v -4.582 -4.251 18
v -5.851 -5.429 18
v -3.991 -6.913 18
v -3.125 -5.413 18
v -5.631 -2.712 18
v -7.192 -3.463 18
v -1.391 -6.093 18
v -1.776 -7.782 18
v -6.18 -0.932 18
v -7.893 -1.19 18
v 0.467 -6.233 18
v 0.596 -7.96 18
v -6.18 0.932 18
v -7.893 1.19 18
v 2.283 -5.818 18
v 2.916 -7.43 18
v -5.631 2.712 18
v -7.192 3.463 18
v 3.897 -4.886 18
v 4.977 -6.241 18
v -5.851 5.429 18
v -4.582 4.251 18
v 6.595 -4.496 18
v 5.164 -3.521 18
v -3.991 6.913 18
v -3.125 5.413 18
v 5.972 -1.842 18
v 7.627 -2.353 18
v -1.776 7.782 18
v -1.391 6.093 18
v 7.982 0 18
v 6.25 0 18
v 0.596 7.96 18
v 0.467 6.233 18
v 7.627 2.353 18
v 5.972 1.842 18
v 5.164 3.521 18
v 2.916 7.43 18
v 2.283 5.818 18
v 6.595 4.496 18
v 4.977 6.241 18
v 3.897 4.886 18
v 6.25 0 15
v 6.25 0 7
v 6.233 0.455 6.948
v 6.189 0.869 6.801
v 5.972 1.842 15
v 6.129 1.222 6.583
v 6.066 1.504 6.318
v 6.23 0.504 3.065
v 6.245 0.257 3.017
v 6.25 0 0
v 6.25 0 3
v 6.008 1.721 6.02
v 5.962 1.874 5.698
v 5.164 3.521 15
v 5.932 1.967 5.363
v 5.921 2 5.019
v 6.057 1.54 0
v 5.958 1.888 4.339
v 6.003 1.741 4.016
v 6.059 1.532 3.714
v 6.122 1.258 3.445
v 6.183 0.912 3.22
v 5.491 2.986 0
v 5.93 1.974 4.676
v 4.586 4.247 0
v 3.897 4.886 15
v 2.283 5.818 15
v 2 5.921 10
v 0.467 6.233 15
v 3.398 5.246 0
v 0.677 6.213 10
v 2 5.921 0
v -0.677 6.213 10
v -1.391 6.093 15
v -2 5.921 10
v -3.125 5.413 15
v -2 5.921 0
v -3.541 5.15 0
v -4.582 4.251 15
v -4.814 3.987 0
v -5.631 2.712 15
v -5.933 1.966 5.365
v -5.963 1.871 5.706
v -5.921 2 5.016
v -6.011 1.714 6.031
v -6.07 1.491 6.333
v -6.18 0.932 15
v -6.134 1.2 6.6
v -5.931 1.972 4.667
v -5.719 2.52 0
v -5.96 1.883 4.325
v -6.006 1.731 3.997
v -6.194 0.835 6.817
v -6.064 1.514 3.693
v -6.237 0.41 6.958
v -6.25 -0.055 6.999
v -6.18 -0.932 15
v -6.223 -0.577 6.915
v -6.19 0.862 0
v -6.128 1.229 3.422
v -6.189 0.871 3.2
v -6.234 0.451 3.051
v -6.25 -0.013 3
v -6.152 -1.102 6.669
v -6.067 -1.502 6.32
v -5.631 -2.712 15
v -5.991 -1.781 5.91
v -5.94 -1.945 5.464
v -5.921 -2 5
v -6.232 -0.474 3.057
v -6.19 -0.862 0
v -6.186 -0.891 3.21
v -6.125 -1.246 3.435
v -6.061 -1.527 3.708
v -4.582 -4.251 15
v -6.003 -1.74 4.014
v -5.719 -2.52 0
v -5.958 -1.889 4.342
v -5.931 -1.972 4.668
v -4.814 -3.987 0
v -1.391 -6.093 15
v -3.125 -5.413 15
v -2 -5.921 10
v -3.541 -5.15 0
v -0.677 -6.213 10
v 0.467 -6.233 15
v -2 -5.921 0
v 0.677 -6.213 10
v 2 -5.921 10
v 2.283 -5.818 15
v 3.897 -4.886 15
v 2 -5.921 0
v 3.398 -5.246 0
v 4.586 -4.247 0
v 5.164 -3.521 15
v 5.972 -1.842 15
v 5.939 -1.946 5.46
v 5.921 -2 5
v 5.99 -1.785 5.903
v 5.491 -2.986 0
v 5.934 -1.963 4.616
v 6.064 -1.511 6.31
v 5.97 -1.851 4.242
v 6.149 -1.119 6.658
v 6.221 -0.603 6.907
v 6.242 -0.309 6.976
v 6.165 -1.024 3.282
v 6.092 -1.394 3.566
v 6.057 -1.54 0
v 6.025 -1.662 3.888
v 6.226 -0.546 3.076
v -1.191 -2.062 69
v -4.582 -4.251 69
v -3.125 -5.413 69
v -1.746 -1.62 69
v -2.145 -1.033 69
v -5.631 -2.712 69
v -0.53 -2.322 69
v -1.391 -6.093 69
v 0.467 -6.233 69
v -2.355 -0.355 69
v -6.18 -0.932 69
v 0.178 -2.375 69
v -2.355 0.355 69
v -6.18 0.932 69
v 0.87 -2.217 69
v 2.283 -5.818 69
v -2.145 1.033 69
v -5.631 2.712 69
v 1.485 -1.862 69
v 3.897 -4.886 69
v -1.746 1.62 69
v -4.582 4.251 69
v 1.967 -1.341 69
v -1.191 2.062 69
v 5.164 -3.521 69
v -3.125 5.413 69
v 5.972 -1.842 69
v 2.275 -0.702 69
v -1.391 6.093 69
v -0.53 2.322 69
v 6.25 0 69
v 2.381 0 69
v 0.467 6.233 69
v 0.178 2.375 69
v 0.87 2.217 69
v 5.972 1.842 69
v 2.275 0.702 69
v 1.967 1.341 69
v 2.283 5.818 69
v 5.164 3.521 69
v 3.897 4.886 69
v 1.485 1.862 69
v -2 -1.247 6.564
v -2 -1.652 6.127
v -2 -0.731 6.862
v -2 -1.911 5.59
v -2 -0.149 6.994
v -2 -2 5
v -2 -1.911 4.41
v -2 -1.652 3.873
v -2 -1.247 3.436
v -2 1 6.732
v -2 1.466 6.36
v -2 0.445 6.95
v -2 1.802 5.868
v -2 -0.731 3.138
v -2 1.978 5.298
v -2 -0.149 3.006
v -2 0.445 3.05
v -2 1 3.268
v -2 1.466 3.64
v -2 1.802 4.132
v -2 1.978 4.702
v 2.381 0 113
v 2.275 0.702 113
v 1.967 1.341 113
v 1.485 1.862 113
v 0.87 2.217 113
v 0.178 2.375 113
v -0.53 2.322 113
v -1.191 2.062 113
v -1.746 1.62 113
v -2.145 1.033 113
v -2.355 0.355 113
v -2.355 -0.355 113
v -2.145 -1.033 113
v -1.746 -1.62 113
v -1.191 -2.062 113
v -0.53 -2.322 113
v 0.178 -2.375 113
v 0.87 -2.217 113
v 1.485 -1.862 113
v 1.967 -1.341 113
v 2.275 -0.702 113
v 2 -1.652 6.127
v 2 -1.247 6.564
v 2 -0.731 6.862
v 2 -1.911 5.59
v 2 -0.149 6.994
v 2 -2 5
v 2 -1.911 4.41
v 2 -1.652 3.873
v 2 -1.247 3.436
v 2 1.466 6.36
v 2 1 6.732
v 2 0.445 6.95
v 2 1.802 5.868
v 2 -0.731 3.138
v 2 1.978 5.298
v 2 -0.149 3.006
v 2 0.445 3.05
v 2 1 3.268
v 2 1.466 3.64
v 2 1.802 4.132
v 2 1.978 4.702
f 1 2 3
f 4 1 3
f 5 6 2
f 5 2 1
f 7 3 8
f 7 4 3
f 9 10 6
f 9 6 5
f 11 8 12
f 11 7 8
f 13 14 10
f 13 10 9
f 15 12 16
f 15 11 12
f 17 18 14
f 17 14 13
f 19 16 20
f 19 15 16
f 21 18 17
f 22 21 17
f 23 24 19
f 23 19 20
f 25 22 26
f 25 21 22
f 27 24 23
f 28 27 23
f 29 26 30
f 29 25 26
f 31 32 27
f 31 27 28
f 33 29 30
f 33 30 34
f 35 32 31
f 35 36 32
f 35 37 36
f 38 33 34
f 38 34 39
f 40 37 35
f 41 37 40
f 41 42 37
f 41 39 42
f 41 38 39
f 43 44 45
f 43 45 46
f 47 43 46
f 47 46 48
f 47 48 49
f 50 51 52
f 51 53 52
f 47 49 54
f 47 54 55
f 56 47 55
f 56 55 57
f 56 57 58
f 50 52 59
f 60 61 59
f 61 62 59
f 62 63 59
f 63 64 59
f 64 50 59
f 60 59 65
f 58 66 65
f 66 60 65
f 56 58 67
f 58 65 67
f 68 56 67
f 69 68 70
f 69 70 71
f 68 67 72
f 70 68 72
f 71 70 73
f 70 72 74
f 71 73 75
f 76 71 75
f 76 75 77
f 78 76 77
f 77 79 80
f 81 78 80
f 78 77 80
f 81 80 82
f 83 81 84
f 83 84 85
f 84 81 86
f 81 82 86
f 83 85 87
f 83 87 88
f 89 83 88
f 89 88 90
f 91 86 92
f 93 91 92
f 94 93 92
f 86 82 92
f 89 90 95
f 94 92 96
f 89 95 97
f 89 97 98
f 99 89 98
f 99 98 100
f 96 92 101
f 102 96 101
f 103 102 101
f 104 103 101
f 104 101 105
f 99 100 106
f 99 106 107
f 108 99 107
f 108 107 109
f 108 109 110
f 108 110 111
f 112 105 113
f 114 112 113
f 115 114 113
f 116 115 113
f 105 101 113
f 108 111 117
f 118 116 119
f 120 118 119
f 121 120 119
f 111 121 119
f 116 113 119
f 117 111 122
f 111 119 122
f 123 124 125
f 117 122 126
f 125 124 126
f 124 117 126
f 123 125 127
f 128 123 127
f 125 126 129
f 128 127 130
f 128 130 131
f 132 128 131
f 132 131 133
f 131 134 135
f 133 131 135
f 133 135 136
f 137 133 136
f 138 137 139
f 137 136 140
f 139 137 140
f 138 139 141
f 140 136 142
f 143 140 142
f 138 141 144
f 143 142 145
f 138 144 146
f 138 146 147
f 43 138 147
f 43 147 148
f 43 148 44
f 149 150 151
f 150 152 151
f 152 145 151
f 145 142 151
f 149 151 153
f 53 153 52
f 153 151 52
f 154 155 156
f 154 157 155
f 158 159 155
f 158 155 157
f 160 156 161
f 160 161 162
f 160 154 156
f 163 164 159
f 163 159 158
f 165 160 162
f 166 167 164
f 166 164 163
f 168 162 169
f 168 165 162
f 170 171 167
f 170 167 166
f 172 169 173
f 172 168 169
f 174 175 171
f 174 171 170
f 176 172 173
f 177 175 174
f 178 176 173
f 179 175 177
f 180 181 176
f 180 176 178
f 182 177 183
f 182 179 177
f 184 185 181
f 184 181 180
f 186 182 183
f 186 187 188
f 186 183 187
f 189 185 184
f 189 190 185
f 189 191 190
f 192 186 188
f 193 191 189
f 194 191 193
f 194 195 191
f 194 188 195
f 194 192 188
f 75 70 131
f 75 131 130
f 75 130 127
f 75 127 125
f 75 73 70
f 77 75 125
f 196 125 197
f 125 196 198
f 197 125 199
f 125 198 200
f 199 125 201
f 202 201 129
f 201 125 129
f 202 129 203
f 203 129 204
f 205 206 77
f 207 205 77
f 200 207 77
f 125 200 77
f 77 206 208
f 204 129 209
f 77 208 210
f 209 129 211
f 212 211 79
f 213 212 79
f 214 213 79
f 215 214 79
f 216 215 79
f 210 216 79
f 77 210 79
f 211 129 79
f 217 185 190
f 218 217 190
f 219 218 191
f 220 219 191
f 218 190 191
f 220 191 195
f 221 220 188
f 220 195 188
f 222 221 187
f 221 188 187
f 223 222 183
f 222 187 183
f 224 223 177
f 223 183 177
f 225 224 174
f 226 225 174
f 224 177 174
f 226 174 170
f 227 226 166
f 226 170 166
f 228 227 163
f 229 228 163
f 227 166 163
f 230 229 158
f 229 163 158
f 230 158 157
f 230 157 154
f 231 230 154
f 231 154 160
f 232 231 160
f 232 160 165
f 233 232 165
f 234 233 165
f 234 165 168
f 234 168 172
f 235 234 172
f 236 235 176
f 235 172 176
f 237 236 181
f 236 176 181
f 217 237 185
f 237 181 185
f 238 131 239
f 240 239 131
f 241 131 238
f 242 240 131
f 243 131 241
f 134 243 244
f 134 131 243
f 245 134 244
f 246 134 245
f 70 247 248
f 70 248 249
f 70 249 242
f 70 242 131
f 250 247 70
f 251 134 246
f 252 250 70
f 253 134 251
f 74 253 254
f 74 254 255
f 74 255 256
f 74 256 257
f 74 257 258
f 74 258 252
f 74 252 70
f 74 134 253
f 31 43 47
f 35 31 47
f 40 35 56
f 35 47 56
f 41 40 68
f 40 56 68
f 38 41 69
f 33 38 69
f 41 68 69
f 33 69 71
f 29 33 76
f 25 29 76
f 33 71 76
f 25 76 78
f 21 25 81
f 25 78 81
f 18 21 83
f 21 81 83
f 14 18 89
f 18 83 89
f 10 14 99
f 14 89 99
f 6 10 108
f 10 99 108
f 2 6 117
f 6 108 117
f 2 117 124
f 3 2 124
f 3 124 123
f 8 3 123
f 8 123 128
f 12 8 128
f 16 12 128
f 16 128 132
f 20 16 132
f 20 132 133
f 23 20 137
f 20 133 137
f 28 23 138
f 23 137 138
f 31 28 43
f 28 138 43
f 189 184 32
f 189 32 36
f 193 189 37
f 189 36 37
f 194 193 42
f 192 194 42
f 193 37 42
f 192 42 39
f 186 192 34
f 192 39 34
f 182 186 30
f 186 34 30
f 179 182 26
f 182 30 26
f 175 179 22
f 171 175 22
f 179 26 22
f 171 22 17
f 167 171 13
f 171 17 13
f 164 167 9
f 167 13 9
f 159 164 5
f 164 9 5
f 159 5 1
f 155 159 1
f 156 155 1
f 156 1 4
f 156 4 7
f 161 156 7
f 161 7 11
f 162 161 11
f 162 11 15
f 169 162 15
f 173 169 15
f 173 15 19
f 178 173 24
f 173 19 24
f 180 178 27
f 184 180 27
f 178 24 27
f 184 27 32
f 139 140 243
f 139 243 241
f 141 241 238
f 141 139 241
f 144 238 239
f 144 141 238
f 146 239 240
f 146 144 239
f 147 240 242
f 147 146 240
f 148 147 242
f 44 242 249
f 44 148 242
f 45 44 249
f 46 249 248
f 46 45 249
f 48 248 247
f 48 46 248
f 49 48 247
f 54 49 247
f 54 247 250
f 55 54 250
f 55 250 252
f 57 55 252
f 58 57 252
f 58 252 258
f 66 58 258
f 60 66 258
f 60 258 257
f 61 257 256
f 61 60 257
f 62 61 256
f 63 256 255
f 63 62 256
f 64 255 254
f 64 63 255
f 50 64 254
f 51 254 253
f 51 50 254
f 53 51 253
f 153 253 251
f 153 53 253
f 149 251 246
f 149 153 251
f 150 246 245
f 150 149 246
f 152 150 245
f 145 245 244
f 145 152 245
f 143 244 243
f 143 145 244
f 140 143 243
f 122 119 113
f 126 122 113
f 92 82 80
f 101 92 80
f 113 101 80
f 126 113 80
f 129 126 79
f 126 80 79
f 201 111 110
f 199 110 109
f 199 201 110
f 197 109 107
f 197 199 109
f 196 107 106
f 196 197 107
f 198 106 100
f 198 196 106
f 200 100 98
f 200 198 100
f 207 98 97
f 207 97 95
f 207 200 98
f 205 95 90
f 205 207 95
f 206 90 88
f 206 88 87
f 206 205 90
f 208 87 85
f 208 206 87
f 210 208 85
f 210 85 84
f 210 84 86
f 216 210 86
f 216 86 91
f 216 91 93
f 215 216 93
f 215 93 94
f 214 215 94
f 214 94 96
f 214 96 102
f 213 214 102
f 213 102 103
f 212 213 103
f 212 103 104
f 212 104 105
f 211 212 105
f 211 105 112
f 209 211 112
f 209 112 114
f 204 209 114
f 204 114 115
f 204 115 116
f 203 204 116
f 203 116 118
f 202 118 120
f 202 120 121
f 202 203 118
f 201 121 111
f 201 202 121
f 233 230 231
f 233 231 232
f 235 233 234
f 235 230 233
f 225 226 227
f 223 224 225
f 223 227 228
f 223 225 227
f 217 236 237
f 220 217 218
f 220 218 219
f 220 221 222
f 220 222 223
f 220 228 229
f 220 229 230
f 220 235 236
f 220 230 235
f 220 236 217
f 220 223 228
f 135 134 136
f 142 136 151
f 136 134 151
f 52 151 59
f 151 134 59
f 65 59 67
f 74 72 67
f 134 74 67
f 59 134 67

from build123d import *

# Parameters (mm, degrees)
SKETCH1_R               = 6.25
BOSS_EXTRUDE1_DEPTH     = 15
SKETCH2_R               = 6.25
BOSS_EXTRUDE2_DEPTH     = 3
BOSS_EXTRUDE2_DRAFT     = -30
SKETCH3_R               = 6.25
BOSS_EXTRUDE3_DEPTH     = 51
SKETCH4_R               = 2.38125
BOSS_EXTRUDE4_DEPTH     = 44
SKETCH5_W               = 4
SKETCH5_H               = 14.941049413
CUT_EXTRUDE1_DEPTH      = 10
CUT_EXTRUDE2_DEPTH      = 114.720510346
CUT_EXTRUDE2_DEPTH_BACK = 114.720510346
SKETCH6_R               = 2


with BuildPart() as part:
    # Sketch1 → Boss-Extrude1 (new body)
    with BuildSketch(Plane.XY):
        Circle(SKETCH1_R)
    extrude(amount=BOSS_EXTRUDE1_DEPTH)


with BuildPart() as boss_extrude2_tool:
    # Sketch2 → Boss-Extrude2 (with draft: the straight prism first)
    with BuildSketch(Plane.XY.offset(15)):
        Circle(SKETCH2_R)
    extrude(amount=BOSS_EXTRUDE2_DEPTH)
    # Boss-Extrude2: the draft: its side faces are tilted about the plane it starts from
    boss_extrude2_sides = [boss_extrude2_tool.faces().sort_by_distance(p)[0] for p in [
        (-6.25, 0, 16.5),
    ]]
    draft(boss_extrude2_sides, Plane.XY.offset(15), BOSS_EXTRUDE2_DRAFT)


with BuildPart() as part_1:
    add(part.part)

    # Boss-Extrude2: add boss_extrude2_tool
    add(boss_extrude2_tool.part)

    # Sketch3 → Boss-Extrude3 (add)
    with BuildSketch(Plane.XY.offset(18)):
        Circle(SKETCH3_R)
    extrude(amount=BOSS_EXTRUDE3_DEPTH)

    # Sketch4 → Boss-Extrude4 (add)
    with BuildSketch(Plane.XY.offset(69)):
        Circle(SKETCH4_R)
    extrude(amount=BOSS_EXTRUDE4_DEPTH)

    # Sketch5 → Cut-Extrude1 (cut)
    with BuildSketch(Plane(origin=(0, 0, 0), x_dir=(-1, 0, 0), z_dir=(0, 0, -1))):
        with Locations((0, 0.333395318)):
            Rectangle(SKETCH5_W, SKETCH5_H)
    extrude(amount=-CUT_EXTRUDE1_DEPTH, mode=Mode.SUBTRACT)

    # Sketch6 → Cut-Extrude2 (cut, two sides: drawn at the far end of the back side and taken through both)
    with BuildSketch(Plane.ZY.offset(-2).offset(-CUT_EXTRUDE2_DEPTH_BACK)):
        with Locations(Location((5, 0, 0), (0, 0, 270))):
            Circle(SKETCH6_R)
    extrude(amount=CUT_EXTRUDE2_DEPTH + CUT_EXTRUDE2_DEPTH_BACK, mode=Mode.SUBTRACT)


solid = part_1.part
